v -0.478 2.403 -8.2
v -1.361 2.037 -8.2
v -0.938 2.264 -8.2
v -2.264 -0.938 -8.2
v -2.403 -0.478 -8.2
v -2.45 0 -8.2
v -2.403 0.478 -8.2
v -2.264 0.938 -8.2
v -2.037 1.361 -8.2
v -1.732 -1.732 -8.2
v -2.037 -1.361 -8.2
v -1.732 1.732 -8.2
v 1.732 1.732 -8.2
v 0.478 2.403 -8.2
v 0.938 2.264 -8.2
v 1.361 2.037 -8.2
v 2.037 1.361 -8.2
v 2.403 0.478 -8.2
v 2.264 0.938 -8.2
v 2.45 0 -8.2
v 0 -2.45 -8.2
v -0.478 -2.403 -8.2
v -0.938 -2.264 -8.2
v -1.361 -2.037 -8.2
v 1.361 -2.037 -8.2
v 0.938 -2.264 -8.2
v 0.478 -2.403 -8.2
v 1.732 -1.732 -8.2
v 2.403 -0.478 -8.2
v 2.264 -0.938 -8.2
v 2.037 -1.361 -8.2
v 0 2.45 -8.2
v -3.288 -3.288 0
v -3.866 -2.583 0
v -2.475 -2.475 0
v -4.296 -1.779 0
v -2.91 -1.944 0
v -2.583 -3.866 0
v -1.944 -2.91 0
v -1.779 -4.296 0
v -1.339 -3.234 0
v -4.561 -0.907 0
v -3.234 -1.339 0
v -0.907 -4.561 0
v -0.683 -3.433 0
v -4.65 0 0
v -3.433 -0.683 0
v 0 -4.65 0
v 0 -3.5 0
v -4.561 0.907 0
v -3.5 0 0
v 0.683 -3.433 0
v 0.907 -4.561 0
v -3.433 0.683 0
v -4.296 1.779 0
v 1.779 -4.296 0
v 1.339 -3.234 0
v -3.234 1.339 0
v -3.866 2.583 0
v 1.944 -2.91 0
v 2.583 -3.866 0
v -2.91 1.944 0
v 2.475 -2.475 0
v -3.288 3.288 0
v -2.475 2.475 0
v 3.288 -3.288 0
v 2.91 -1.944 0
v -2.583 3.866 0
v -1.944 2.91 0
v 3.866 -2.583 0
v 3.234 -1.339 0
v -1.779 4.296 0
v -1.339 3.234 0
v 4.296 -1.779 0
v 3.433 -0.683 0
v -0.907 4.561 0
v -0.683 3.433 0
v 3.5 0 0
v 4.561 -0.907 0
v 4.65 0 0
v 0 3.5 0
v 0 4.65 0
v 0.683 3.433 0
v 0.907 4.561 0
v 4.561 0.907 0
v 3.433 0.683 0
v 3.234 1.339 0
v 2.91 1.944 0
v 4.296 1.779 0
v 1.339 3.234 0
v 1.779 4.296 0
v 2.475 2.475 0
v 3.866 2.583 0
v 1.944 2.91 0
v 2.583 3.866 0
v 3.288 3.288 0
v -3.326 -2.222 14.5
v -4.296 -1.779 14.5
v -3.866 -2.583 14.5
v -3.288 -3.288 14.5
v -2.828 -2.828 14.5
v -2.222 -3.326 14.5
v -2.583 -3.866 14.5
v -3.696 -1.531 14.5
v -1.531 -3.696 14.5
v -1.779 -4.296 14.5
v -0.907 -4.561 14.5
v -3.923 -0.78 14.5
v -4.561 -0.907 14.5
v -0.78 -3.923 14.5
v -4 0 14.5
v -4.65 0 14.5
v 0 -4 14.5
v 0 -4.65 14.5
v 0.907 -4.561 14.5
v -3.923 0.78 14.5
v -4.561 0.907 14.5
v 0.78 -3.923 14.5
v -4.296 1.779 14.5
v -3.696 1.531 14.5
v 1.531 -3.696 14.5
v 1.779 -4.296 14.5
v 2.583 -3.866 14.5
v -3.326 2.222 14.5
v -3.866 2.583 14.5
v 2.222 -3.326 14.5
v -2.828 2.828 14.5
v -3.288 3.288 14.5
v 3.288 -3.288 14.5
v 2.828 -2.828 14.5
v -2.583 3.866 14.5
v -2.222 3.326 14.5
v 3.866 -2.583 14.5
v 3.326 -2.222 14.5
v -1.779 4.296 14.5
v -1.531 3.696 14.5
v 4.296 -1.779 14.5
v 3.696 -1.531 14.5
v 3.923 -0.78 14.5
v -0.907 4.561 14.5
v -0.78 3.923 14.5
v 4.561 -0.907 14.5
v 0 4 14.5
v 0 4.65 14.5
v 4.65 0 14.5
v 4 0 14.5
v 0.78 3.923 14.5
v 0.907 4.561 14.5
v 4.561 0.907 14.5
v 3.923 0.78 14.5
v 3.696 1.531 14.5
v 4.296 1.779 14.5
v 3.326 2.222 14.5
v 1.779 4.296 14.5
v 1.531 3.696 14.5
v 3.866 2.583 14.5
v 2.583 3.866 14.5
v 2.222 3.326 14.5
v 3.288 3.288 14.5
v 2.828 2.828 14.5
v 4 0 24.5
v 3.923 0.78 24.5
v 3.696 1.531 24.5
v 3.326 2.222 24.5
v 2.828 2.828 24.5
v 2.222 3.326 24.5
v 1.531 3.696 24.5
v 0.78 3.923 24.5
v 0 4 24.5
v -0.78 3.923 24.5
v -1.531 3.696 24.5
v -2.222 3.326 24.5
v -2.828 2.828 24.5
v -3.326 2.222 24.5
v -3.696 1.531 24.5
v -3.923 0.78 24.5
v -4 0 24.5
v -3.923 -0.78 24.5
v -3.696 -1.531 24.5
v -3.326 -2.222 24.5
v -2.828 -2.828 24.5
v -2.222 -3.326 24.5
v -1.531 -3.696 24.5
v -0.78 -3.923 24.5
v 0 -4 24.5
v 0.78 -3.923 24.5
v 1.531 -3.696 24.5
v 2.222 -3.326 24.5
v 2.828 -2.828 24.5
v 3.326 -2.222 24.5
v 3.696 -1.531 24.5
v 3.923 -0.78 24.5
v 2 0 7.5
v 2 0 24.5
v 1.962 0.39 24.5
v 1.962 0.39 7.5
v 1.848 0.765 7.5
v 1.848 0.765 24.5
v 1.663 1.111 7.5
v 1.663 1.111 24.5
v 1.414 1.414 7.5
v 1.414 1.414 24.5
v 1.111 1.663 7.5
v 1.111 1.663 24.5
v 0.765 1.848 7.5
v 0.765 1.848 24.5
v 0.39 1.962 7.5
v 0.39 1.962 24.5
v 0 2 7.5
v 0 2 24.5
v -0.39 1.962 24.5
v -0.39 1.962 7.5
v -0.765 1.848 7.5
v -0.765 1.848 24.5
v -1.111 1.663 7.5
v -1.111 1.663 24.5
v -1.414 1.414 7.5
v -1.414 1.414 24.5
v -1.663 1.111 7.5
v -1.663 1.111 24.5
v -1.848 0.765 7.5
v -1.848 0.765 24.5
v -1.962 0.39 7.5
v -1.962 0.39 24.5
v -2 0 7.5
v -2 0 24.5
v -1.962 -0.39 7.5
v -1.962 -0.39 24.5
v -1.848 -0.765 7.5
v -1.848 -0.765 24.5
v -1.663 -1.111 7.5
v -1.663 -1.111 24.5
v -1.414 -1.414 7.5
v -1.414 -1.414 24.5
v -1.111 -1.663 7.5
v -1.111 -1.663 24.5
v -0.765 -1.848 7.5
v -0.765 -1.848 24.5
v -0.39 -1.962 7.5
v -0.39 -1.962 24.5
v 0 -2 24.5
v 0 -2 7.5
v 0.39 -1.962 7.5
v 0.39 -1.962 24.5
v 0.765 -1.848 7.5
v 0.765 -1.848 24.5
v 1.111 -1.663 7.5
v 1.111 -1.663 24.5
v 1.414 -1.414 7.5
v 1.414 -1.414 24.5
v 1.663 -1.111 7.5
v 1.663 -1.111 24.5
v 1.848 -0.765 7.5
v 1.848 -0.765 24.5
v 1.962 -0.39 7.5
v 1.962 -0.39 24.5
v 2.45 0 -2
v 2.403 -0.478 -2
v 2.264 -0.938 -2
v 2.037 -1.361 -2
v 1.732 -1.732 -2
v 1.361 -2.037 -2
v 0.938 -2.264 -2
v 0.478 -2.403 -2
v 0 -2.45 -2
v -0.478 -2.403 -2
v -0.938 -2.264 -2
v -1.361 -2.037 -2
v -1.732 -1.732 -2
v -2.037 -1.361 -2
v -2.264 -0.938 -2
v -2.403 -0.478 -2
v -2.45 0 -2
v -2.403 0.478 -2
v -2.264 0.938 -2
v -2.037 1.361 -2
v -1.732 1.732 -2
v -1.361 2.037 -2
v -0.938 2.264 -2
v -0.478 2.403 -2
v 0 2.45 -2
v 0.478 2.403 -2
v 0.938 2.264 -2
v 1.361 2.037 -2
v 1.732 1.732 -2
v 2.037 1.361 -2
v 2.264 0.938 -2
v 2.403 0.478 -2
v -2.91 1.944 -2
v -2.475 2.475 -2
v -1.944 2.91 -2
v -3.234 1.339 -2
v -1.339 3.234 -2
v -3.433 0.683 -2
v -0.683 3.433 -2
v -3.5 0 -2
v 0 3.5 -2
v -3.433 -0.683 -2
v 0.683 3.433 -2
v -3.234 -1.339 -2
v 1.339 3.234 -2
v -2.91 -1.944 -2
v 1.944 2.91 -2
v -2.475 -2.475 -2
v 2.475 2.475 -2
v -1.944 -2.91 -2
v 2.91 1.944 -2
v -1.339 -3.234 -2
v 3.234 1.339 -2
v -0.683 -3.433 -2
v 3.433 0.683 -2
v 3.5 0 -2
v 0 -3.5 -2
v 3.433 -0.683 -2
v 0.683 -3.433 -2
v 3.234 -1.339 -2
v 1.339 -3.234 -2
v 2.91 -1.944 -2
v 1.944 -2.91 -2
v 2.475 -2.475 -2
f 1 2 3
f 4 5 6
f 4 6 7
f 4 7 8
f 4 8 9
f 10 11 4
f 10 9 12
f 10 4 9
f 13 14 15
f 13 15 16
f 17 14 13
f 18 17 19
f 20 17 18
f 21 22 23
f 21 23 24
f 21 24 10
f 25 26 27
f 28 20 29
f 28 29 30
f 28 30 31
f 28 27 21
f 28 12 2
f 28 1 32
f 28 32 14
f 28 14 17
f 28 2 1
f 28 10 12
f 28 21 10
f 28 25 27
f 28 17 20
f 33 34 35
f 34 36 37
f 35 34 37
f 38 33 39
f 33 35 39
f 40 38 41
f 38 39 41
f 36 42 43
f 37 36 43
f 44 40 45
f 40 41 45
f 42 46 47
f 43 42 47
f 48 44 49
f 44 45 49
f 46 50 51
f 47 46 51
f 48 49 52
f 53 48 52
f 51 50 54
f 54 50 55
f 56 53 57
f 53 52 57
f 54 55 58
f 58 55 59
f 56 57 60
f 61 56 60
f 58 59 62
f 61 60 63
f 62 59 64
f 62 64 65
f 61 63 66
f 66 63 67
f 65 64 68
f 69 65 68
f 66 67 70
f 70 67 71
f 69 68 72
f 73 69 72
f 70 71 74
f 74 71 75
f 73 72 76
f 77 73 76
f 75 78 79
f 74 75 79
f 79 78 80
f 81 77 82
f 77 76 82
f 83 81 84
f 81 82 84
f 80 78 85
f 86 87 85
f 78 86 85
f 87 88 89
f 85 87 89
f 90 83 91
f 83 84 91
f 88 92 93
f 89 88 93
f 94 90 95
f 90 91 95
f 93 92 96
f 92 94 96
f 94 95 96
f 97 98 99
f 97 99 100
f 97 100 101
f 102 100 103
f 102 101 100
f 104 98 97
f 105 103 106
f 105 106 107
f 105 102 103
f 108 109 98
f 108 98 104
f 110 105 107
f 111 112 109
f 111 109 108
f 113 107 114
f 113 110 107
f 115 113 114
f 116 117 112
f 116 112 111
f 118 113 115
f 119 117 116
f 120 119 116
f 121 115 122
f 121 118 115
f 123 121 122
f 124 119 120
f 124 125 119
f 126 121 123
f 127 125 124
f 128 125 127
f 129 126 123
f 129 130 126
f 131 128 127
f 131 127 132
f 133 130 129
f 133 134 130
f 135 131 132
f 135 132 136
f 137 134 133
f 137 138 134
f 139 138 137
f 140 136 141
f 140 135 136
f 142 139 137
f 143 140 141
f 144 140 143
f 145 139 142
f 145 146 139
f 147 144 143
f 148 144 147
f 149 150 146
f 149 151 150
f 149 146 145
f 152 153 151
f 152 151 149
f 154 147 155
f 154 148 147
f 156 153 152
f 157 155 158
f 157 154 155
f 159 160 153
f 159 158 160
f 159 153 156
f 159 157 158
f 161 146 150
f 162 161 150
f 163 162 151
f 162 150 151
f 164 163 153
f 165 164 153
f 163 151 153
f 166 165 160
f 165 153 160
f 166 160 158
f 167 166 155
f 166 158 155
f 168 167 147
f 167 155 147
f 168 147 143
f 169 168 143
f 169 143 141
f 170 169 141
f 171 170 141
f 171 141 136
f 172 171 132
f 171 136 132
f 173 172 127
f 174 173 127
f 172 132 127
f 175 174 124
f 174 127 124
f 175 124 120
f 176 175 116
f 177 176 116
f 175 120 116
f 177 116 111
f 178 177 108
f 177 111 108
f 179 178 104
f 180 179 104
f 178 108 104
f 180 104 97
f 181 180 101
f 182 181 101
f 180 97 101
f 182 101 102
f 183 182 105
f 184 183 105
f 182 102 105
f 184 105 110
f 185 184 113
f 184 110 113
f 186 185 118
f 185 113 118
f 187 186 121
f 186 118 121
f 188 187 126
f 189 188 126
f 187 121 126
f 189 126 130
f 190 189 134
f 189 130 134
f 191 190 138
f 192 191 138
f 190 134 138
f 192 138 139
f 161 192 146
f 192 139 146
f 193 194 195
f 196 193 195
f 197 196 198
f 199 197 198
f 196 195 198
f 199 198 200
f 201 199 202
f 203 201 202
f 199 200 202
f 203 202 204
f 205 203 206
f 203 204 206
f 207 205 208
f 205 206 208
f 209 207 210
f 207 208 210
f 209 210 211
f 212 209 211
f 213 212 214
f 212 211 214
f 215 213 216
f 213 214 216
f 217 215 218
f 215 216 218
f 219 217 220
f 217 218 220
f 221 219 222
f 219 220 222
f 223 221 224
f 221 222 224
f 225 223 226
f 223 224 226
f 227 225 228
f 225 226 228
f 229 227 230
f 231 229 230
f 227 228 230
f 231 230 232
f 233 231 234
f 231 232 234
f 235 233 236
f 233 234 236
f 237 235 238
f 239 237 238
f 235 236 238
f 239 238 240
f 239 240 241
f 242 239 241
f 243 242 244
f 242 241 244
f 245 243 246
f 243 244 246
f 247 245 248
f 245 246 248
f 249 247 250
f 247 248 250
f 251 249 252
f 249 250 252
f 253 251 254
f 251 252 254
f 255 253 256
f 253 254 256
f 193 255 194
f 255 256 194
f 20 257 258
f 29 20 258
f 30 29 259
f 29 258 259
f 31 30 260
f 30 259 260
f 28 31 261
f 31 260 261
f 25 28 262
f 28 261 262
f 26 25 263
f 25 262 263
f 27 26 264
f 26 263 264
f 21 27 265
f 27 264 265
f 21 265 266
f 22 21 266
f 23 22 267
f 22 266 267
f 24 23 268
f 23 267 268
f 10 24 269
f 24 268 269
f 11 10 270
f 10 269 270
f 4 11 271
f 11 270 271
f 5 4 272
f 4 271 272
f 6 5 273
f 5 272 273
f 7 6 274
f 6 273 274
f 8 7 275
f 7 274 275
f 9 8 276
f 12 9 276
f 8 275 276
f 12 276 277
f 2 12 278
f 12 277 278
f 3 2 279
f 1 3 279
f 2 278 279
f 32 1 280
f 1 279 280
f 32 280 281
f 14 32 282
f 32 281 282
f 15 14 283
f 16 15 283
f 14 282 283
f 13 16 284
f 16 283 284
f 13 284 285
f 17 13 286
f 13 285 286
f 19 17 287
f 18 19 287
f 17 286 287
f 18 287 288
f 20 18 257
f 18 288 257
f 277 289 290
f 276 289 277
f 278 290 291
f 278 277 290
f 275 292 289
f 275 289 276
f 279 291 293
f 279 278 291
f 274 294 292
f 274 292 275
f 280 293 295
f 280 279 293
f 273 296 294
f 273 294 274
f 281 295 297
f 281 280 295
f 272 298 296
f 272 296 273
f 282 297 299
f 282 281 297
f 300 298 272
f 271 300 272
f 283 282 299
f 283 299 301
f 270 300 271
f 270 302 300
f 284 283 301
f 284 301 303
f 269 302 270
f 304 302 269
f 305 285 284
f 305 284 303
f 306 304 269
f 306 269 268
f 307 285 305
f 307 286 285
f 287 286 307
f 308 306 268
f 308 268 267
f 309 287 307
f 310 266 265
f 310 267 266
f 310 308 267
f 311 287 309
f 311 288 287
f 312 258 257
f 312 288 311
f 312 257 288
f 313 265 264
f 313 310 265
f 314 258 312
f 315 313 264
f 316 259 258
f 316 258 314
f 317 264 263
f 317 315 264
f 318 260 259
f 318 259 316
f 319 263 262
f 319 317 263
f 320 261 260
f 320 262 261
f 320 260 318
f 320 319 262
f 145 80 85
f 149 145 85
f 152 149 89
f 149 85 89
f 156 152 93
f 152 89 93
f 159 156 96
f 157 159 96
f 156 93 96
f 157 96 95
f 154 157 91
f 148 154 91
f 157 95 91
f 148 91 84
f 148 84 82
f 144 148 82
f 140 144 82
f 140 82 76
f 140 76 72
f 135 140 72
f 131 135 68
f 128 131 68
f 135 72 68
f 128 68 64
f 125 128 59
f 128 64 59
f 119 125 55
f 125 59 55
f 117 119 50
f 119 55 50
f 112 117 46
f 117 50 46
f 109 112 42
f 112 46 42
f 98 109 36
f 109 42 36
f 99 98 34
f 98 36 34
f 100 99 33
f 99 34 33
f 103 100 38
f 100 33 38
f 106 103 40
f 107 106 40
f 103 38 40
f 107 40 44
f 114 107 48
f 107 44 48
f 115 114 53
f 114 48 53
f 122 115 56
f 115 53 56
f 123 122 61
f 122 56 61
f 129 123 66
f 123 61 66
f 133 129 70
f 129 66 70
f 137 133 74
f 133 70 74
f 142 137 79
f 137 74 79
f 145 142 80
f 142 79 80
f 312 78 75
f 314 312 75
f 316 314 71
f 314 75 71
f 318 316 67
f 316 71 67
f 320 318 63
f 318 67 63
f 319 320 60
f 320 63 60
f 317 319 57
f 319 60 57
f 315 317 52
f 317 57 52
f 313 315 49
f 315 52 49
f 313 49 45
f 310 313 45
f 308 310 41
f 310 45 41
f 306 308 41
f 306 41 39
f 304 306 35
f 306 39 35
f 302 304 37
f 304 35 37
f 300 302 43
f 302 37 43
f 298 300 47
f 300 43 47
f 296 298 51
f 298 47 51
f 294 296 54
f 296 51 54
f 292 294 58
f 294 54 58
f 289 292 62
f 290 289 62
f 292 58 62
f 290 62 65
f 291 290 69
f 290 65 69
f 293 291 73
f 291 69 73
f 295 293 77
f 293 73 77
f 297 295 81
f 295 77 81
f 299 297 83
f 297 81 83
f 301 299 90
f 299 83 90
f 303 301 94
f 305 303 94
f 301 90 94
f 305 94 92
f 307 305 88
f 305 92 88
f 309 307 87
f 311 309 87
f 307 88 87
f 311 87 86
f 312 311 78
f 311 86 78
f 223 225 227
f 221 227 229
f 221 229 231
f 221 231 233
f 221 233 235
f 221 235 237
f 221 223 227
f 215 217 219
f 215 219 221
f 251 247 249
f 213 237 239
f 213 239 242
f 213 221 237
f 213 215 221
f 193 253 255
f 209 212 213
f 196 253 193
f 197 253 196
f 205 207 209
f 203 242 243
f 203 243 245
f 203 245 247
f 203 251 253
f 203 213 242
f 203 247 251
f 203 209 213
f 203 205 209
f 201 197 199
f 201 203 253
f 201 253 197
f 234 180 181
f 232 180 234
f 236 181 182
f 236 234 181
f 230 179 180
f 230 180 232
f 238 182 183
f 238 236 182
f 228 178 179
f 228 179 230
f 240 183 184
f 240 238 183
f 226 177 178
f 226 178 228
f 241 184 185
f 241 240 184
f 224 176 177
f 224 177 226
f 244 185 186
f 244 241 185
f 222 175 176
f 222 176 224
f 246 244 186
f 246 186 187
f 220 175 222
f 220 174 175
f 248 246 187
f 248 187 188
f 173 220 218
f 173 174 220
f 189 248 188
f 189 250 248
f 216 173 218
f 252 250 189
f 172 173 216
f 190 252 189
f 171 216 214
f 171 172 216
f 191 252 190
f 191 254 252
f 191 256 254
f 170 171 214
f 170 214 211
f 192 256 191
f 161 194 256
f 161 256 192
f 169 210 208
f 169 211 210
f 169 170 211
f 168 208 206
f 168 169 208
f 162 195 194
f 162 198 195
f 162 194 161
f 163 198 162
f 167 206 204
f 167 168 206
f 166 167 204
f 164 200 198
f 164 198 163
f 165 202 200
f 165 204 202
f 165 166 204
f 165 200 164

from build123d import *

# Parameters (mm, degrees)
F0_R     = 4.65
F1_DEPTH = 14.5
F2_R     = 4
F3_DEPTH = 10
F4_R     = 2
F5_DEPTH = 17
F6_R     = 3.5
F7_DEPTH = 2
F8_R     = 2.45
F9_DEPTH = 6.2


with BuildPart() as f1:
    # F0 (on Top) → F1 (new body)
    with BuildSketch(Plane.XY):
        Circle(F0_R)
    extrude(amount=F1_DEPTH)

    # F2 (on face) → F3 (join)
    with BuildSketch(Plane.XY.offset(14.5)):
        Circle(F2_R)
    extrude(amount=F3_DEPTH)

    # F4 (on face) → F5 (cut)
    with BuildSketch(Plane.XY.offset(24.5)):
        Circle(F4_R)
    extrude(amount=-F5_DEPTH, mode=Mode.SUBTRACT)

    # F6 (on face) → F7 (join)
    with BuildSketch(Plane(origin=(0, 0, 0), x_dir=(1, 0, 0), z_dir=(0, 0, -1))):
        Circle(F6_R)
    extrude(amount=F7_DEPTH)

    # F8 (on face) → F9 (join)
    with BuildSketch(Plane(origin=(0, 0, -2), x_dir=(1, 0, 0), z_dir=(0, 0, -1))):
        Circle(F8_R)
    extrude(amount=F9_DEPTH)


solid = f1.part
